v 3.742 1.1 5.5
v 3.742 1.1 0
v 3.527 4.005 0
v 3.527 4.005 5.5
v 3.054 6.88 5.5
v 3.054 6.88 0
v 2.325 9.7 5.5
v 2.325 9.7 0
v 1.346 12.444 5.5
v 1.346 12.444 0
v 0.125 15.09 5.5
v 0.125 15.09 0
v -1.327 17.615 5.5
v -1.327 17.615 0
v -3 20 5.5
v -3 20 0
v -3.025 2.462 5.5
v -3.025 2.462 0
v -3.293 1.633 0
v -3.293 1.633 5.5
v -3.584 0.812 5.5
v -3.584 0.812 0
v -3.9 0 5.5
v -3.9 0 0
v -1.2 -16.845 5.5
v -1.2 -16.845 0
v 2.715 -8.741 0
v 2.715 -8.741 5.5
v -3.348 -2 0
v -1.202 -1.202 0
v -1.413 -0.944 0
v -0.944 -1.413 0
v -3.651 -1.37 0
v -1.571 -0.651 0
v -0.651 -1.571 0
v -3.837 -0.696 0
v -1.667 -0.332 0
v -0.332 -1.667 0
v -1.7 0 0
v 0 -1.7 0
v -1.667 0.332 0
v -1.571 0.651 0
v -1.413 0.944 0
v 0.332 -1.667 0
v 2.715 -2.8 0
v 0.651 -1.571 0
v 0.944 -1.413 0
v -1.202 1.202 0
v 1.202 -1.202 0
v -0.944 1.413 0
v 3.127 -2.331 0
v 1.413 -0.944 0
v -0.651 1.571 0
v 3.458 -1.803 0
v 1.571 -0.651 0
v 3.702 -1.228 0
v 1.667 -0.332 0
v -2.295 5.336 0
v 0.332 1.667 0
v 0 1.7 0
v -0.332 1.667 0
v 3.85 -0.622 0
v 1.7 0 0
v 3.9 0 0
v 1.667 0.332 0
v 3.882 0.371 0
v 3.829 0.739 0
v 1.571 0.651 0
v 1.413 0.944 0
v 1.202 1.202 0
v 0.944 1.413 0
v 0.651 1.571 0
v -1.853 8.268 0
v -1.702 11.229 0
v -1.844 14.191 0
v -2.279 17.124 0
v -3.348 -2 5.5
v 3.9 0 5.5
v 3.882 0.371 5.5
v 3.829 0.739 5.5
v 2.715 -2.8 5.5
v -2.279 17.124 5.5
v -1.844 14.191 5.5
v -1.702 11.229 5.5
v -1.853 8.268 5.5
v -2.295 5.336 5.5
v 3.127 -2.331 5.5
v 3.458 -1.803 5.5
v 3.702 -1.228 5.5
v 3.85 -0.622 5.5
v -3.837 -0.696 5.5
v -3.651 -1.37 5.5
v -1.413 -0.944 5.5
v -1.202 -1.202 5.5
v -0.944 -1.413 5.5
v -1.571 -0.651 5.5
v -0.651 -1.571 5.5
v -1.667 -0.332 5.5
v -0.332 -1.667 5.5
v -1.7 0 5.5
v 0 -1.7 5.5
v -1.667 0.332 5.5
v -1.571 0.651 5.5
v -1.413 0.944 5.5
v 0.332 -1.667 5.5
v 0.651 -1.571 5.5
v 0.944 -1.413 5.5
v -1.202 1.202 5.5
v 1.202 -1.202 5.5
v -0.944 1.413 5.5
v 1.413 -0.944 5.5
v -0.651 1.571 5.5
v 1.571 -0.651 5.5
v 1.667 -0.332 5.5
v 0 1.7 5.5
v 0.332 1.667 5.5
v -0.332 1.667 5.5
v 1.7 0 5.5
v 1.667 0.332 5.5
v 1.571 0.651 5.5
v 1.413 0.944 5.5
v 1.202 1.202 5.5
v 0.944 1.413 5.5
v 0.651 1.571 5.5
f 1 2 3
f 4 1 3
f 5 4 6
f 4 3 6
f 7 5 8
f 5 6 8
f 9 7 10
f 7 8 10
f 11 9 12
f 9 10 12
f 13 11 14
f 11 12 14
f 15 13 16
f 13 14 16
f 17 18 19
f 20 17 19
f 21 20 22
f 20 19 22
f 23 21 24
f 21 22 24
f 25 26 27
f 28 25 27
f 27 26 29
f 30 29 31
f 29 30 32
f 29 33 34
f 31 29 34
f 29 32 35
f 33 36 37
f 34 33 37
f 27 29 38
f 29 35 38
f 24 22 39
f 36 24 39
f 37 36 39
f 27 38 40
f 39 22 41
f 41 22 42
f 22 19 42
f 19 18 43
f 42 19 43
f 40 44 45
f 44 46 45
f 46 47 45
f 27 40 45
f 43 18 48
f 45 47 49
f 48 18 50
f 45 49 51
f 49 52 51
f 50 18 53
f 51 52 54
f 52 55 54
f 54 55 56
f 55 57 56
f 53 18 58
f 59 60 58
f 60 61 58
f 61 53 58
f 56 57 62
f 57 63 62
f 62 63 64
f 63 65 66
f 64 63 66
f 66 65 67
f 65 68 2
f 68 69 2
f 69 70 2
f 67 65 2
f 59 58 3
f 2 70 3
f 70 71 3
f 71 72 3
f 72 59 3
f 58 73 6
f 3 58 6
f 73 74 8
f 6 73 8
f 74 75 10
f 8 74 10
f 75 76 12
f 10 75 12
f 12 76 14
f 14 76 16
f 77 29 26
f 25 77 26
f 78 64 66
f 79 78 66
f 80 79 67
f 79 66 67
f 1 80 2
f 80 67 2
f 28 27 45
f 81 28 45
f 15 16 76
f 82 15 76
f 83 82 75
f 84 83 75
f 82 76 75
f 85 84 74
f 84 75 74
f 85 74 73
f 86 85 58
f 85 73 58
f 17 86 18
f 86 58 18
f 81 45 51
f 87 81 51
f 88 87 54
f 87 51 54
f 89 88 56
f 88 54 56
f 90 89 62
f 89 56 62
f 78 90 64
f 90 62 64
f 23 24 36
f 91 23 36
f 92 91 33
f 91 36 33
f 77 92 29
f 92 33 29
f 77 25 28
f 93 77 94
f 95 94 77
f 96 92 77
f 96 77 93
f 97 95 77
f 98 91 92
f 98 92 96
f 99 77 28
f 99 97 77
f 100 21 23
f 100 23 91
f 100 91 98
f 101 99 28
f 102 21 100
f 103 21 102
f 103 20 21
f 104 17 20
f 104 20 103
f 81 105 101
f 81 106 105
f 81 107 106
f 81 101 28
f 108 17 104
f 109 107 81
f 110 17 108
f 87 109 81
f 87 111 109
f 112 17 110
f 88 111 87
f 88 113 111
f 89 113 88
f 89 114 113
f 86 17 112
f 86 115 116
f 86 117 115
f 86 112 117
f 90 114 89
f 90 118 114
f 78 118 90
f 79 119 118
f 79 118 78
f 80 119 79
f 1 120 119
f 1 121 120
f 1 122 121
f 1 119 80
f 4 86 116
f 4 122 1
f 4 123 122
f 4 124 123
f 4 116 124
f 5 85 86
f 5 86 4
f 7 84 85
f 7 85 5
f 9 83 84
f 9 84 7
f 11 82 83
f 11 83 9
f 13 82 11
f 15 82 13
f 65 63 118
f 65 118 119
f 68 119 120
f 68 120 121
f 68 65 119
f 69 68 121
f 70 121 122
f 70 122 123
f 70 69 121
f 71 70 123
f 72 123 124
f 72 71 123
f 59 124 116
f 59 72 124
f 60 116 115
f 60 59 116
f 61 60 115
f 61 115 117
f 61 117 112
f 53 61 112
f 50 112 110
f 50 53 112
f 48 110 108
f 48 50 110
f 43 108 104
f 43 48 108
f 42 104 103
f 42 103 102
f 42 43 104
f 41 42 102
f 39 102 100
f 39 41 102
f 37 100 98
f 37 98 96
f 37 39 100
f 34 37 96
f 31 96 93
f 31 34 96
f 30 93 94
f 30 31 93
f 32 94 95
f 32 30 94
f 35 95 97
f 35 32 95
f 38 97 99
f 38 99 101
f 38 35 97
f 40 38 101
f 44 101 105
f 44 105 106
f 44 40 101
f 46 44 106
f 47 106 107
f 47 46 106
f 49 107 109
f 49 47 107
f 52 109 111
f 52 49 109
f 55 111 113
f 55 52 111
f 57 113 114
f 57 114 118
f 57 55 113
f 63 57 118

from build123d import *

# Parameters (mm, degrees)
F0_R     = 1.7
F1_DEPTH = 5.5


with BuildPart() as f1:
    # F0 (on Top) → F1 (new body)
    with BuildSketch(Plane.XY):
        with BuildLine():
            ThreePointArc((-3.024665, 2.461991), (0.769594, 3.823313), (3.741657, 1.1))
            ThreePointArc((3.741657, 1.1), (1.866017, 11.083336), (-3, 20))
            ThreePointArc((-3, 20), (-1.70213, 11.229153), (-3.024665, 2.461991))
        make_face()
        with BuildLine():
            ThreePointArc((2.714774, -2.8), (3.591491, -1.52026), (3.9, 0))
            ThreePointArc((3.9, 0), (3.860211, 0.555669), (3.741657, 1.1))
            ThreePointArc((3.741657, 1.1), (0.769594, 3.823313), (-3.024665, 2.461991))
            ThreePointArc((-3.024665, 2.461991), (-3.435515, 1.221461), (-3.9, 0))
            ThreePointArc((-3.9, 0), (-3.759503, -1.037371), (-3.348134, -2))
            ThreePointArc((-3.348134, -2), (-0.510182, -3.866486), (2.714774, -2.8))
        make_face()
        Circle(F0_R, mode=Mode.SUBTRACT)
        with BuildLine():
            Line((2.714774, -8.741404), (2.714774, -2.8))
            ThreePointArc((2.714774, -2.8), (-0.510182, -3.866486), (-3.348134, -2))
            Line((-3.348134, -2), (-1.2, -16.845387))
            Line((-1.2, -16.845387), (2.714774, -8.741404))
        make_face()
    extrude(amount=F1_DEPTH)


solid = f1.part
